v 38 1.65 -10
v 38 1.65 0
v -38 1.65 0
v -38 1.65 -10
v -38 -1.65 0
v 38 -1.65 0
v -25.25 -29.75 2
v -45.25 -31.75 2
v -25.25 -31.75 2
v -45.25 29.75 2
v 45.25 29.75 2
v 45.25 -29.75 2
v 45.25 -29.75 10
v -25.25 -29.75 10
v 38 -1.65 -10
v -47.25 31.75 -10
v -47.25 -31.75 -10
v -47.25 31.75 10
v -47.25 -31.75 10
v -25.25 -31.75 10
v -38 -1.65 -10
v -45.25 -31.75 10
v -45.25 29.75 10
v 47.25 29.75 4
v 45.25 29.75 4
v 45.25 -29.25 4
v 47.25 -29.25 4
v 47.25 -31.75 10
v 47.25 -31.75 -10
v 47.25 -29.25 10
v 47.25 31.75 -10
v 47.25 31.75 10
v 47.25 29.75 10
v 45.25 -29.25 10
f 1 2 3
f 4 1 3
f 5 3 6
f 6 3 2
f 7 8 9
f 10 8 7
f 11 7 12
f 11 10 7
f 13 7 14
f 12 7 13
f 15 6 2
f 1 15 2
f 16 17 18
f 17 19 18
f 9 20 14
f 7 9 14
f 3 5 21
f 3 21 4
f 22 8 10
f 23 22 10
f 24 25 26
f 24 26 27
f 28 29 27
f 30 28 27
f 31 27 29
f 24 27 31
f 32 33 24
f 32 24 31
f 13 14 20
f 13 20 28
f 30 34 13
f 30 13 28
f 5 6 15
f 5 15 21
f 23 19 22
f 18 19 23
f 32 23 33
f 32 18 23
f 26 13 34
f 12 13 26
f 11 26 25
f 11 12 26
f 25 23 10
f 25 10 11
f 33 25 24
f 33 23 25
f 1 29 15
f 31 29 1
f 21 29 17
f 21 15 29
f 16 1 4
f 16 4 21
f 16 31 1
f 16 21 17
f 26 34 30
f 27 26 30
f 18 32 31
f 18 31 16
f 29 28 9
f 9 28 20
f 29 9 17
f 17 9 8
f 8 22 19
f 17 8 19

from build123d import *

# Parameters (mm, degrees)
SKETCH1_W           = 94.5
SKETCH1_H           = 63.5
SKETCH1_W_2         = 90.5
SKETCH1_H_2         = 59.5
BOSS_EXTRUDE1_DEPTH = 10
SKETCH2_W           = 94.5
SKETCH2_H           = 63.5
BOSS_EXTRUDE2_DEPTH = 2
SKETCH3_W           = 94.5
SKETCH3_H           = 63.5
SKETCH3_W_2         = 76
SKETCH3_H_2         = 3.3
BOSS_EXTRUDE3_DEPTH = 10
SKETCH5_W           = 20
SKETCH5_H           = 2
CUT_EXTRUDE1_DEPTH  = 8
SKETCH6_W           = 2
SKETCH6_H           = 59
CUT_EXTRUDE2_DEPTH  = 6


with BuildPart() as part:
    # Sketch1 → Boss-Extrude1 (new body)
    with BuildSketch(Plane.XY):
        Rectangle(SKETCH1_W, SKETCH1_H)
        Rectangle(SKETCH1_W_2, SKETCH1_H_2, mode=Mode.SUBTRACT)
    extrude(amount=BOSS_EXTRUDE1_DEPTH)

    # Sketch2 → Boss-Extrude2 (add)
    with BuildSketch(Plane.XY):
        Rectangle(SKETCH2_W, SKETCH2_H)
    extrude(amount=BOSS_EXTRUDE2_DEPTH)

    # Sketch3 → Boss-Extrude3 (add)
    with BuildSketch(Plane(origin=(0, 0, 0), x_dir=(-1, 0, 0), z_dir=(0, 0, -1))):
        Rectangle(SKETCH3_W, SKETCH3_H)
        Rectangle(SKETCH3_W_2, SKETCH3_H_2, mode=Mode.SUBTRACT)
    extrude(amount=BOSS_EXTRUDE3_DEPTH)

    # Sketch5 → Cut-Extrude1 (cut)
    with BuildSketch(Plane.XY.offset(10)):
        with Locations((-35.25, -30.75)):
            Rectangle(SKETCH5_W, SKETCH5_H)
    extrude(amount=-CUT_EXTRUDE1_DEPTH, mode=Mode.SUBTRACT)

    # Sketch6 → Cut-Extrude2 (cut)
    with BuildSketch(Plane.XY.offset(10)):
        with Locations((46.25, 0.25)):
            Rectangle(SKETCH6_W, SKETCH6_H)
    extrude(amount=-CUT_EXTRUDE2_DEPTH, mode=Mode.SUBTRACT)


solid = part.part
